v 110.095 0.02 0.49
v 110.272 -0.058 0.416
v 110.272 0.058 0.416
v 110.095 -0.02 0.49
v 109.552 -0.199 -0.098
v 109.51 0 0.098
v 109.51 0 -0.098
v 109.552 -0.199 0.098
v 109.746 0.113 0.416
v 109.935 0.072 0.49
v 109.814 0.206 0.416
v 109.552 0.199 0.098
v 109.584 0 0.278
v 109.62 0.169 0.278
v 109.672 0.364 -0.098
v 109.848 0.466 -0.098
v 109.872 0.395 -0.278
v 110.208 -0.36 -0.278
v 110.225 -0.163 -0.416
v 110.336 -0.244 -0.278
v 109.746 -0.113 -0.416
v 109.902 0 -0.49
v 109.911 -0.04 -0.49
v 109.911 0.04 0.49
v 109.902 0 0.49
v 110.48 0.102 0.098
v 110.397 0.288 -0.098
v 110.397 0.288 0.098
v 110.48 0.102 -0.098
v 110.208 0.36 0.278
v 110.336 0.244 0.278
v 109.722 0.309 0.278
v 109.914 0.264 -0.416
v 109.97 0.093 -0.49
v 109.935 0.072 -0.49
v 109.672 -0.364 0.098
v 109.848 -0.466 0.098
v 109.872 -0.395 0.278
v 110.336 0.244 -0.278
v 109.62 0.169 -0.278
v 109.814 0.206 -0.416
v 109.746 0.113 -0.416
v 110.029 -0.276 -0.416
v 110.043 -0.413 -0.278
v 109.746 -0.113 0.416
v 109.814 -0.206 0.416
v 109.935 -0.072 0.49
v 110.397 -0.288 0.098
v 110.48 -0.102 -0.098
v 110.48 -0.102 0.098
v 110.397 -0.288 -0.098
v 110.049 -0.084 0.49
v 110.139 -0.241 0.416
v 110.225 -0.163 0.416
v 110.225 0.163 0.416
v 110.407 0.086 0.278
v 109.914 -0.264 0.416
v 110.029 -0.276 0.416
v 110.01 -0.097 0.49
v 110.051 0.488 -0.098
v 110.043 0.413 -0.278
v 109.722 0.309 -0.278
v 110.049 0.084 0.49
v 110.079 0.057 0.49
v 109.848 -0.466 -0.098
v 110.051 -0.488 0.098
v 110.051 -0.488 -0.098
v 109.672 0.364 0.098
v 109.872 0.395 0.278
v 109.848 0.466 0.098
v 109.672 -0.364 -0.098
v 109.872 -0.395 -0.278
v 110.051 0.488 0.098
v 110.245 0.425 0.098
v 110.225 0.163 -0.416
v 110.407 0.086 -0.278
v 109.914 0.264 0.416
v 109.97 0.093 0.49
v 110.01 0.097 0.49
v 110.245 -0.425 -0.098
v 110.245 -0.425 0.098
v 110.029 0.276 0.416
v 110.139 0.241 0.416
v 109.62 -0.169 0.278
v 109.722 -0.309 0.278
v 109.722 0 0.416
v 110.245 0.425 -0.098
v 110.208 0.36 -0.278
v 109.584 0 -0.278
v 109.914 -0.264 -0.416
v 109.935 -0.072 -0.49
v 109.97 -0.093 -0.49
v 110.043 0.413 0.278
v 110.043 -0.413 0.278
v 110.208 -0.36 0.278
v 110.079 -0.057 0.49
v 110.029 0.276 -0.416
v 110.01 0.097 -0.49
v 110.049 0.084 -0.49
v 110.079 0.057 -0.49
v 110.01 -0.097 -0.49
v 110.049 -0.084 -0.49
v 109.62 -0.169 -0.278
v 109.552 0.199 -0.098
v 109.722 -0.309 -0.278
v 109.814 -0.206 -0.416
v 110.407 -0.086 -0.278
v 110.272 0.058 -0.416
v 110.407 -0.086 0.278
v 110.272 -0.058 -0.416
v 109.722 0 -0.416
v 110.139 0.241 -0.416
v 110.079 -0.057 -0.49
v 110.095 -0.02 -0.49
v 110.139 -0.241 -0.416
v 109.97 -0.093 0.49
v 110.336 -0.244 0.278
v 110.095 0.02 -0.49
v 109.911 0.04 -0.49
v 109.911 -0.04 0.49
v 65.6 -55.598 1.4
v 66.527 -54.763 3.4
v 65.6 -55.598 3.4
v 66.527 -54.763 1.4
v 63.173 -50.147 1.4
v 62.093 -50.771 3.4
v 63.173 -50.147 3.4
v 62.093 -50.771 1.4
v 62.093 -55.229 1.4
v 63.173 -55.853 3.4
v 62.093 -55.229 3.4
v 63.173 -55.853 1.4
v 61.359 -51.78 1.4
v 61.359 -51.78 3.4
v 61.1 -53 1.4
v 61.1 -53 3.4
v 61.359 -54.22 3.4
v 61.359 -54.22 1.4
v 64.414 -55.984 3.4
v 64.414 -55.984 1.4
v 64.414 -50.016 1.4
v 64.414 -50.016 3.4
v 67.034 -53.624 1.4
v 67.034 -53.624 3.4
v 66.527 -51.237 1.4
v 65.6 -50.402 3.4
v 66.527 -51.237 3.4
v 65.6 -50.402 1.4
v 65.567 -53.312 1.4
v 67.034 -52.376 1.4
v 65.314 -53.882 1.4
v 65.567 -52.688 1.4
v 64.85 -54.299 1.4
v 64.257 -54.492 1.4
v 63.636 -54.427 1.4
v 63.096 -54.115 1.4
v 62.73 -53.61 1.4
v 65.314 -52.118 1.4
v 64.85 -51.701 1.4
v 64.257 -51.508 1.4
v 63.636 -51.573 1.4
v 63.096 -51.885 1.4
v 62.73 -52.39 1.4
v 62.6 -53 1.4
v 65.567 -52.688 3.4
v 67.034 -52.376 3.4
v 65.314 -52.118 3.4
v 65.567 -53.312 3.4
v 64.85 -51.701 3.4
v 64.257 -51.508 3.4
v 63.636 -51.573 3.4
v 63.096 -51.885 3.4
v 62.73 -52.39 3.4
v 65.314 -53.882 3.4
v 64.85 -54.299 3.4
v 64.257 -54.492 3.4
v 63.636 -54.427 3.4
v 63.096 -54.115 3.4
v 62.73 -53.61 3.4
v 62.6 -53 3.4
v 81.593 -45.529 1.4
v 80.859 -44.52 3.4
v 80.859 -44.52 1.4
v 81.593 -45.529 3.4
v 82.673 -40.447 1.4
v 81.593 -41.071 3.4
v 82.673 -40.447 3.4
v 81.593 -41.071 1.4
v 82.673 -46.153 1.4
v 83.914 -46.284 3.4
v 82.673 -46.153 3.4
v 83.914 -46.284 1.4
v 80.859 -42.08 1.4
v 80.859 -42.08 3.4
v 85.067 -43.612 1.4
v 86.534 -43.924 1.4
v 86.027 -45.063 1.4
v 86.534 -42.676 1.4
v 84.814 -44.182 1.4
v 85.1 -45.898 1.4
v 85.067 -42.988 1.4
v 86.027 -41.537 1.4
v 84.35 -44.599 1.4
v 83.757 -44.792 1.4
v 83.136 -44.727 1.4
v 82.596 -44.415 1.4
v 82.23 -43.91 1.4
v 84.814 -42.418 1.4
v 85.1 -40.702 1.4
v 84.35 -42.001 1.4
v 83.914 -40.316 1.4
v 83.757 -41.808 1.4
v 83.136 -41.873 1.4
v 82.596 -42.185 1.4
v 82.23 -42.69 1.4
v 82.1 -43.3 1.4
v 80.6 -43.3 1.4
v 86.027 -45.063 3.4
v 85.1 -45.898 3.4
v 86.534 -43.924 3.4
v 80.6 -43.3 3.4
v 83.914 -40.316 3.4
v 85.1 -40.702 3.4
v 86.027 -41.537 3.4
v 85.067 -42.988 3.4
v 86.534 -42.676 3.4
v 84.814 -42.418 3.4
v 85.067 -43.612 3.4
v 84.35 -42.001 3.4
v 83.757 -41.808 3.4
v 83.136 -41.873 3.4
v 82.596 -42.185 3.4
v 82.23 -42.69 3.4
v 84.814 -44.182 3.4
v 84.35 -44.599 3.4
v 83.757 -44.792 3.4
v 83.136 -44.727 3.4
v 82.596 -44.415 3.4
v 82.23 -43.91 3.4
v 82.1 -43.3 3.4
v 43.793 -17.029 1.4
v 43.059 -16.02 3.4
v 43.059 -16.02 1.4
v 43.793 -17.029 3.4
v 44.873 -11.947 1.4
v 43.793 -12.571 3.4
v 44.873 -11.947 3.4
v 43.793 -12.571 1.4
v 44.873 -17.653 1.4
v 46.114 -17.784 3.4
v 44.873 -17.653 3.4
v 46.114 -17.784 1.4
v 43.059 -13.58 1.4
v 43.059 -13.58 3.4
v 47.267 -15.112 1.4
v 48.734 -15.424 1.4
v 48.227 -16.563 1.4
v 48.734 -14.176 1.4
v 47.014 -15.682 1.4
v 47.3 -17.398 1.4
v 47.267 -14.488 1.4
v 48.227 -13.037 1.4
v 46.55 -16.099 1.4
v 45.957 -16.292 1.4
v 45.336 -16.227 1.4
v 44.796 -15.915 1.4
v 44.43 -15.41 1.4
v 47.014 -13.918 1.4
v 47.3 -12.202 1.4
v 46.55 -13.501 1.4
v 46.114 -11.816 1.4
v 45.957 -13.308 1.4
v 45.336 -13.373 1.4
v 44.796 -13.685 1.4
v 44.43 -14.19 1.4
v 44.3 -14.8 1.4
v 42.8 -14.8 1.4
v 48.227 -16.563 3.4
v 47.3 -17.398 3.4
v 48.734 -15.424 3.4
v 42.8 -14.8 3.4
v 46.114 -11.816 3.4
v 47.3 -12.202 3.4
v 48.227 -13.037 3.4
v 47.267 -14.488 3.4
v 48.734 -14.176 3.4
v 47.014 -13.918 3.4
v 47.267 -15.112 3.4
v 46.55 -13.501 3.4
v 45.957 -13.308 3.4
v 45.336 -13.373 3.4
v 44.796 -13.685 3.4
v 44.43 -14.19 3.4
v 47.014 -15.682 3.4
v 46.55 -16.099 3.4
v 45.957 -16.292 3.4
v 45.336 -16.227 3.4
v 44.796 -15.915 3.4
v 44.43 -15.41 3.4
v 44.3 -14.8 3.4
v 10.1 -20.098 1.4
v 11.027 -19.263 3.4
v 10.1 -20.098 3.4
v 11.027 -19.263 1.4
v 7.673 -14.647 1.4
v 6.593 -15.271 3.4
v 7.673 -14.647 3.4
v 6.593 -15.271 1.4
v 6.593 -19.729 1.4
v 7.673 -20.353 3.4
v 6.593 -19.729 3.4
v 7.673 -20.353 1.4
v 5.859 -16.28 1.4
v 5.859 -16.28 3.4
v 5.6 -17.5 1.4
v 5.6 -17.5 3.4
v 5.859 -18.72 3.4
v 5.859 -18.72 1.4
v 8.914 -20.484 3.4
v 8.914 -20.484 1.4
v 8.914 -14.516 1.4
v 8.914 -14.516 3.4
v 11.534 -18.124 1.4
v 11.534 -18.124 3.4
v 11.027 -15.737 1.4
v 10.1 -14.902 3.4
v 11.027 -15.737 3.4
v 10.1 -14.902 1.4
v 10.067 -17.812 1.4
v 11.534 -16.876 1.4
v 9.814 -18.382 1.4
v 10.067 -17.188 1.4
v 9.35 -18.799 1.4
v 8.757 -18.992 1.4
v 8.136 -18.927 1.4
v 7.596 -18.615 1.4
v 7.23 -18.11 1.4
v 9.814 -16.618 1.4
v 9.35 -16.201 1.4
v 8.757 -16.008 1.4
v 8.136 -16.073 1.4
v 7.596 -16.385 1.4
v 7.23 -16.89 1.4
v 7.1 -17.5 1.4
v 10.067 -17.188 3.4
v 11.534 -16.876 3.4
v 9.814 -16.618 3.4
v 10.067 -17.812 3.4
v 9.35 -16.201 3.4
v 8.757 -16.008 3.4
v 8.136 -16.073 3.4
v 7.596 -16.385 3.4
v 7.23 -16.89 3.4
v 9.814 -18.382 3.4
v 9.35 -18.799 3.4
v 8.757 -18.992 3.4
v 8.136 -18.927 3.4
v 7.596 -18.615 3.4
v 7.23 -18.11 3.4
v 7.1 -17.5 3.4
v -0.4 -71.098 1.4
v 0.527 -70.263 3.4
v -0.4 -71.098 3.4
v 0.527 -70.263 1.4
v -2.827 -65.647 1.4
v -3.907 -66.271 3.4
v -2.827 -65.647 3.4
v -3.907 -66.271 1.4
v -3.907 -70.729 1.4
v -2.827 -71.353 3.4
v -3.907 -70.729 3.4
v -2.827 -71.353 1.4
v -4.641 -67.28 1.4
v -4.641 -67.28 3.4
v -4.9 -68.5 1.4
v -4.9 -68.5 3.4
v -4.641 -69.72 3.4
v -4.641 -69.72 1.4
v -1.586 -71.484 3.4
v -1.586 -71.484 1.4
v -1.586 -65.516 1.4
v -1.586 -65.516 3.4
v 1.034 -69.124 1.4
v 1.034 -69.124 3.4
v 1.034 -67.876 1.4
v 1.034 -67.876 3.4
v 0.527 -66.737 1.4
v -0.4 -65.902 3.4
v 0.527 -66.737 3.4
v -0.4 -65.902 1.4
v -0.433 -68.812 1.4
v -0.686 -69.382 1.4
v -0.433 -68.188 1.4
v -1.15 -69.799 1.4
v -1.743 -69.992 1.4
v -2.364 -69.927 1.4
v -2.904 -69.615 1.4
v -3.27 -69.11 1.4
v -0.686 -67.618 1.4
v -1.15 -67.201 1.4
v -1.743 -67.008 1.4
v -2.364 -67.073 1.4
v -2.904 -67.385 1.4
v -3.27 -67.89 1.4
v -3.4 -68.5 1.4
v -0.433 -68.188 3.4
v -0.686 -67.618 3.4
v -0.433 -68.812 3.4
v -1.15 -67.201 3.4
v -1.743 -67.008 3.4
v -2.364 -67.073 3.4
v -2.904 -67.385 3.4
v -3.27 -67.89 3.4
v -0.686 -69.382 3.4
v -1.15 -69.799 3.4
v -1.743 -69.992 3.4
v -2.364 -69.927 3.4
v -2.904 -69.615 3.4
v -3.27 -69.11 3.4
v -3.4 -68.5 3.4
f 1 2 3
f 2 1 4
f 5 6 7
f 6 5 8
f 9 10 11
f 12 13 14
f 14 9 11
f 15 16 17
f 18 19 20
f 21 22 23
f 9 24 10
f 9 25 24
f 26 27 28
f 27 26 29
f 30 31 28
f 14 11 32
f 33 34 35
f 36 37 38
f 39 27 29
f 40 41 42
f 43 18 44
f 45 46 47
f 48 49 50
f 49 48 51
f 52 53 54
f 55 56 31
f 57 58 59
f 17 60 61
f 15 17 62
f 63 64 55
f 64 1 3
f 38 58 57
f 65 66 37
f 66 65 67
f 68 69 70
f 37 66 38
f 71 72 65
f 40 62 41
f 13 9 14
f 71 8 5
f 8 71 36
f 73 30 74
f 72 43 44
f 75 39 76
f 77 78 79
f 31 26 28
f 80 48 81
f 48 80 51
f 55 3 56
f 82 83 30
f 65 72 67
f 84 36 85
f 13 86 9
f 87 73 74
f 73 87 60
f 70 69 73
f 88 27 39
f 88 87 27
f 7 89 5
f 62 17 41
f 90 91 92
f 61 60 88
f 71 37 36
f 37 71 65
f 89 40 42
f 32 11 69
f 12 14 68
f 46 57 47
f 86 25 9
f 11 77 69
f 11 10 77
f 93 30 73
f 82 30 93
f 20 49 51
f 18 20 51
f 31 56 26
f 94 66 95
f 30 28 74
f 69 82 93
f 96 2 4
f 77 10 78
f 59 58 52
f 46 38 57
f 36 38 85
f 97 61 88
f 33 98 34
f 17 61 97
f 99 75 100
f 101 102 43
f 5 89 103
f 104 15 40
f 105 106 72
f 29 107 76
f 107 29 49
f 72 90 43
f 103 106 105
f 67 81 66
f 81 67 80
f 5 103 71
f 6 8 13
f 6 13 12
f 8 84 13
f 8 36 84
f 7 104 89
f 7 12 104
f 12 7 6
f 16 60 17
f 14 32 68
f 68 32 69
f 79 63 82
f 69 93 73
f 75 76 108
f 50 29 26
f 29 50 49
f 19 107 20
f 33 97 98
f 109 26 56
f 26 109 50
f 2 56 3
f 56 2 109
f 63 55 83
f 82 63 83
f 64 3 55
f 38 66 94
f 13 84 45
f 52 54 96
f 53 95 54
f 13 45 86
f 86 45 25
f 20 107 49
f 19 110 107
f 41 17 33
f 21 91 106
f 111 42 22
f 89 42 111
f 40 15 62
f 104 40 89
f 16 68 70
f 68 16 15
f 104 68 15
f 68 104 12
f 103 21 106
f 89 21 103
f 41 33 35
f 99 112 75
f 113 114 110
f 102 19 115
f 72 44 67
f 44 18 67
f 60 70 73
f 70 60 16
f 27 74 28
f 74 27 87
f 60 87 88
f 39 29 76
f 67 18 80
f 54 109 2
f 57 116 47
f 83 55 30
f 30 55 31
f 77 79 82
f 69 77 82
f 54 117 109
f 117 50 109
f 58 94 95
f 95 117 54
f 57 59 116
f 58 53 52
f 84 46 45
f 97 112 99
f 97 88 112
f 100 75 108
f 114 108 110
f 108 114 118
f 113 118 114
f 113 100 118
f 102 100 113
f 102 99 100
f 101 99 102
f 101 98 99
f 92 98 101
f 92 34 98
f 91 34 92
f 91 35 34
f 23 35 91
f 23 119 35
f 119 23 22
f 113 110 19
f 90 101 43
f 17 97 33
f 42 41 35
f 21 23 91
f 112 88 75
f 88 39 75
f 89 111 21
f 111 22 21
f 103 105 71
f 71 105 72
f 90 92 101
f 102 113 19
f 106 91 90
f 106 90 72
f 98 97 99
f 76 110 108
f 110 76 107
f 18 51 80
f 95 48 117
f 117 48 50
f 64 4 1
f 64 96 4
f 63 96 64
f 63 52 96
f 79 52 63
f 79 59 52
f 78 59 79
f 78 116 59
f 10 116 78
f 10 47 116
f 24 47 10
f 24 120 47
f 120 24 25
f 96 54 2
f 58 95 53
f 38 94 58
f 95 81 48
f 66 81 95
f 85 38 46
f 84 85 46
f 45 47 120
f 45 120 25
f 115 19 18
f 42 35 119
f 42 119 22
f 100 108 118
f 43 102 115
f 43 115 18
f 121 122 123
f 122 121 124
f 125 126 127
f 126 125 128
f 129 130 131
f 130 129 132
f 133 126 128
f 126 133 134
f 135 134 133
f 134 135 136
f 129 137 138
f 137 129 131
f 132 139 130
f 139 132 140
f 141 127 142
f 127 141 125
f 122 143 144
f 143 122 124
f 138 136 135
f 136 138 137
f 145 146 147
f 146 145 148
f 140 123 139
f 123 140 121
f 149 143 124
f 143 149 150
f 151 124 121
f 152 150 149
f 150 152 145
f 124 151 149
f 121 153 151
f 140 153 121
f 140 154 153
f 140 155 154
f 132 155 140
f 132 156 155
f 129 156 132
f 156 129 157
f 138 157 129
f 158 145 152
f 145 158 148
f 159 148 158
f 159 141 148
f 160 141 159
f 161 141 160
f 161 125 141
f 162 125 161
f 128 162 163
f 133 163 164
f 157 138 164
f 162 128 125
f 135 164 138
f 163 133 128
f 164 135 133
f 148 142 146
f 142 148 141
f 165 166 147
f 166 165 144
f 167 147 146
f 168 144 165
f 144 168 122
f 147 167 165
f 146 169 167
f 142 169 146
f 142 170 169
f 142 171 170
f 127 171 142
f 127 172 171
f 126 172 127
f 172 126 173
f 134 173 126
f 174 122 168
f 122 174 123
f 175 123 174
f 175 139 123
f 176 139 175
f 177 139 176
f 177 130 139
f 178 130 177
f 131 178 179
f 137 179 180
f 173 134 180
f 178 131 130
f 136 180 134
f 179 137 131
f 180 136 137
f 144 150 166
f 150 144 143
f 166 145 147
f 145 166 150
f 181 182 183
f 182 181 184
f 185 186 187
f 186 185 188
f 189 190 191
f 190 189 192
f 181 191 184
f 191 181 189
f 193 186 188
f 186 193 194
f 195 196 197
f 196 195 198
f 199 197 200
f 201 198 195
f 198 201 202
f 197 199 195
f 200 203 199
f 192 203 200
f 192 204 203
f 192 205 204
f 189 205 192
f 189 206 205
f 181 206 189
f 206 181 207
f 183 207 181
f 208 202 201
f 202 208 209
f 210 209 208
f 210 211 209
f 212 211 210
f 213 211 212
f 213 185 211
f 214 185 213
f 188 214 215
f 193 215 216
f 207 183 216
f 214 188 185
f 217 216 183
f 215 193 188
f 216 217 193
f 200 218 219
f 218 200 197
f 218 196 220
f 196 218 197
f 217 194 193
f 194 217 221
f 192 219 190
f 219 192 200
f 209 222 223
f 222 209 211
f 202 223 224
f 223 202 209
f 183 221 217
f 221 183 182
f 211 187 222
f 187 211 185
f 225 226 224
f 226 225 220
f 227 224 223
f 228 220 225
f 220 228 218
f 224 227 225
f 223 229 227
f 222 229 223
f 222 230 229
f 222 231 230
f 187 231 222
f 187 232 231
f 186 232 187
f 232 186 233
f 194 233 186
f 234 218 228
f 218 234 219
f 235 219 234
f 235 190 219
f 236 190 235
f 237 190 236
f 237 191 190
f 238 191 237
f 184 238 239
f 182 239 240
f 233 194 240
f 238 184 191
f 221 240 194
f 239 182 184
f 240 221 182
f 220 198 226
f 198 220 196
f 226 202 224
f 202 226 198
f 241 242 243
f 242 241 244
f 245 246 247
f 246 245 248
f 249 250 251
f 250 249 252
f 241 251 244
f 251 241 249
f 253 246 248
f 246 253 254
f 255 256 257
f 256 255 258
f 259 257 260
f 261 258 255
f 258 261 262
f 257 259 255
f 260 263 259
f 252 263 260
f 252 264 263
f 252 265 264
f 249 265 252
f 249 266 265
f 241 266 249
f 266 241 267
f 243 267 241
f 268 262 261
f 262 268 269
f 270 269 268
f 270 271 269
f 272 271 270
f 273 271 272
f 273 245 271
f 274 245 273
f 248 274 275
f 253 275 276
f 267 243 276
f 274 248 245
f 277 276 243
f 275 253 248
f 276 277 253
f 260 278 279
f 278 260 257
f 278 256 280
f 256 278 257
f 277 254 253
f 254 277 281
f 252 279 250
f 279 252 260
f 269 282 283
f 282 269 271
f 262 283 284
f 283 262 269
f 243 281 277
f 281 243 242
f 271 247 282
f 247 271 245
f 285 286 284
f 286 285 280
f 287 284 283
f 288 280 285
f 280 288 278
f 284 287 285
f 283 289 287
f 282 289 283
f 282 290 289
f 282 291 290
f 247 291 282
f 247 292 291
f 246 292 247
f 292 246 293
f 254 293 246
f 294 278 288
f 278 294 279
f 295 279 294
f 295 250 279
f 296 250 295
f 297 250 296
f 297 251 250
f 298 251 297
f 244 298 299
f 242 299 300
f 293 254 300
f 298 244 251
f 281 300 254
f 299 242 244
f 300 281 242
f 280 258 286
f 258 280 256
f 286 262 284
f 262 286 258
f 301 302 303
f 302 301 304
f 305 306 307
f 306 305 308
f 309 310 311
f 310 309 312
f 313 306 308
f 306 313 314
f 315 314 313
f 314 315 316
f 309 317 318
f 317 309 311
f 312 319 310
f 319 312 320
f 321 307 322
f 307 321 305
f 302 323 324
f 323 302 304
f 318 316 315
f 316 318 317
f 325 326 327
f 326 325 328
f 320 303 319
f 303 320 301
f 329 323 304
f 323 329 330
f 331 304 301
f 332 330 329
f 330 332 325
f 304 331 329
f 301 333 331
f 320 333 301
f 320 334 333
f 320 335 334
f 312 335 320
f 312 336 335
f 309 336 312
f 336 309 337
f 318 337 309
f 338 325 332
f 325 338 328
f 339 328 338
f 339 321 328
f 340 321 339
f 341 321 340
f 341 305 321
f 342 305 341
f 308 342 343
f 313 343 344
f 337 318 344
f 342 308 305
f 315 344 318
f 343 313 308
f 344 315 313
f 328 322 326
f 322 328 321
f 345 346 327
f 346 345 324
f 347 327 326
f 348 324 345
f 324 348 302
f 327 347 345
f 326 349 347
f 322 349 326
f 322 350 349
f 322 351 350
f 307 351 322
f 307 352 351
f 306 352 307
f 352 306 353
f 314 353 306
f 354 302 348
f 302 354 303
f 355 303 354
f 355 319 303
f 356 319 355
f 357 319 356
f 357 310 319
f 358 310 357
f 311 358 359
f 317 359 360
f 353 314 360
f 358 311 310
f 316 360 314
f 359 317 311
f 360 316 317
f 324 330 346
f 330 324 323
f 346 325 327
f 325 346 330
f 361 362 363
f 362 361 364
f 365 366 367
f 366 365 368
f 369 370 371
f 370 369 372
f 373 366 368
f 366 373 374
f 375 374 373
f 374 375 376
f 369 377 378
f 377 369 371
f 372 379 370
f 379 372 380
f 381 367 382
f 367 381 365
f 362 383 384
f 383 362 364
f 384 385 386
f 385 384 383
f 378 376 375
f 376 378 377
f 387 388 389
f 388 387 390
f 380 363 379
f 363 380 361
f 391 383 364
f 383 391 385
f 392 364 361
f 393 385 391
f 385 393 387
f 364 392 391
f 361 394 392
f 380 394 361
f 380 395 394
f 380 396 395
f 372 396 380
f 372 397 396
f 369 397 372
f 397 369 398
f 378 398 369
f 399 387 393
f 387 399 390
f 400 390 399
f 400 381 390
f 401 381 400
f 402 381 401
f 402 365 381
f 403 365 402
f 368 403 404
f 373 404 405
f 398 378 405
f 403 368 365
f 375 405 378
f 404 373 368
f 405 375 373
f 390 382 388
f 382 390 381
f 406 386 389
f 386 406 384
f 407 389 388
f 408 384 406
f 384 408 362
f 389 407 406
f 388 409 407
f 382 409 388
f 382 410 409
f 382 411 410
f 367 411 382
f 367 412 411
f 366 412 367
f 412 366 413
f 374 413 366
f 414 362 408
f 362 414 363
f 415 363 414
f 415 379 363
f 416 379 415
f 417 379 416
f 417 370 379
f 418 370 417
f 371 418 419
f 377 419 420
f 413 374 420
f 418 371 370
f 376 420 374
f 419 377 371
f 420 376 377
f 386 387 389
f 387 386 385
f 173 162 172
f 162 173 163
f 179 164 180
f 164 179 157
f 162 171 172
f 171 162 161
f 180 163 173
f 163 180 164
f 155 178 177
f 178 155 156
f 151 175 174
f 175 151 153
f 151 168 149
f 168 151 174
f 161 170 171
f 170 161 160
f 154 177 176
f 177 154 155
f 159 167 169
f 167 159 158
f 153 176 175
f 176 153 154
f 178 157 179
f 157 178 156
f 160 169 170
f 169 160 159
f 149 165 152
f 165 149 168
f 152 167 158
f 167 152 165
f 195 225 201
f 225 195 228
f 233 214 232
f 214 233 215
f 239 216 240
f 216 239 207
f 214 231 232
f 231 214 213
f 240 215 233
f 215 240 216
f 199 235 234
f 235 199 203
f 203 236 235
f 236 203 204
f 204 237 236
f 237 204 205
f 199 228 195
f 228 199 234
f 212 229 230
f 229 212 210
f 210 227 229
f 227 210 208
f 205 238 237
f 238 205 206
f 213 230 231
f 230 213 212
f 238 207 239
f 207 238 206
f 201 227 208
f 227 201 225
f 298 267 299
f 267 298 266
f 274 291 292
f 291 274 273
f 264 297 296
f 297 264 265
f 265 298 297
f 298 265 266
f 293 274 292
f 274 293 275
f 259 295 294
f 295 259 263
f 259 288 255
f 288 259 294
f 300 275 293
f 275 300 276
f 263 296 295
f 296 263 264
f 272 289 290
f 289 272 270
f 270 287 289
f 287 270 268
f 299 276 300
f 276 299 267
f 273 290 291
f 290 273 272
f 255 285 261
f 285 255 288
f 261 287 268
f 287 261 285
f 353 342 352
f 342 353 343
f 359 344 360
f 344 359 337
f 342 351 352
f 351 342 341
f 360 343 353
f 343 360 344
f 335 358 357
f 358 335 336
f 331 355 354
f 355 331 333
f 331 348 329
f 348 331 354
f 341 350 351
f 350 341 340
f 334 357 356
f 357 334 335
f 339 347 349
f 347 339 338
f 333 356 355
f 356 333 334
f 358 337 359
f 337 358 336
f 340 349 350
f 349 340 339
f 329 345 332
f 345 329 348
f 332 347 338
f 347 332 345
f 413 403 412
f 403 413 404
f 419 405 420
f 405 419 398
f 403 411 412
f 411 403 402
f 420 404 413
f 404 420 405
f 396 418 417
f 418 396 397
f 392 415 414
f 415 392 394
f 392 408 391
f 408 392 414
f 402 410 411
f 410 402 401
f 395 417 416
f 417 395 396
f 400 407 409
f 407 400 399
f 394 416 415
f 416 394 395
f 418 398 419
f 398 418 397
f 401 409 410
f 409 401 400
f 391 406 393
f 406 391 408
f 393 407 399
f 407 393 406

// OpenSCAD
hole_locations = [
    [45.9, -53],
    [26.4, -43.3],
    [64.2, -14.8],
    [101.4, -17.5],
    [111.9, -68.5],
];

pcb_thickness = 1.6;
component_thickness = 2;
case_thickness = 1.5;

plate_thickness = 1.2;
pcb_plate_gap = 1;

total_plate_thickness = plate_thickness + pcb_plate_gap;

total_thickness = pcb_thickness +
    component_thickness + case_thickness +
    total_plate_thickness;

pcb_case_margin = 0.5;
pcb_ridge_margin = 1;

case_wall_thickness = 4;

heat_insert_radius = 1.5;
strut_radius = 3;

// rendering level
$fn = 15;

right_side = true;

module pcb() {
    translate([-75, 50, 0])
    scale([25.4, 25.4, 1])
    import("empty-pcb.dxf");
}

module pcb_ghost() {
    %
    translate([0, 0, case_thickness + component_thickness])
    linear_extrude(pcb_thickness)
    pcb();
}

module pcb_cutout() {
    translate([0, 0, case_thickness + component_thickness])
    linear_extrude(pcb_thickness + total_plate_thickness + 1)
    offset(pcb_case_margin)
    pcb();
}

module component_cutout() {
    translate([0, 0, case_thickness])
    linear_extrude(component_thickness + pcb_thickness + 0.1)
    offset(-pcb_ridge_margin)
    pcb();
}

module case_body() {
    minkowski() {
        linear_extrude(total_thickness)
        offset(case_wall_thickness)
        pcb();
        sphere(0.5);
    }
}

module heat_insert_holes() {
    for (location = hole_locations) {
        translate([location[0], location[1], case_thickness + component_thickness - 3])
        linear_extrude(10)
        circle(heat_insert_radius);
    }
}

module heat_insert_struts() {
    for (location = hole_locations) {
        translate([location[0], location[1], case_thickness - 0.1])
        linear_extrude(component_thickness)
        circle(strut_radius);
    }
}

module wire_port_cutout() {
    translate([24.135, -28, case_thickness + component_thickness + total_thickness / 2+ pcb_thickness])
    rotate([0, 0, 8])
    cube([38.75, 35, total_thickness], center=true);
}

module power_switch_cutout() {
    z_rotation_base = 8;
    z_rotation_delta = 15;

    intersection() {
        translate([27.7, -18.5, 1])
        rotate([0, 0, z_rotation_base + z_rotation_delta])
        cube([12, 10, 6]);

        translate([23.7, -16, 1])
        rotate([0, 0, z_rotation_base - z_rotation_delta])
        cube([12, 10, 6]);

        translate([24.7, -17, 2])
        rotate([-10, 0, z_rotation_base])
        cube([15, 10, 6]);
    }
}

module reset_switch_cutout() {
    intersection() {
        translate([6.4, -42.3, 3])
        rotate([-15, 0, 8])
        cube([10, 15, 6]);
        
        translate([6.4, -41.03, 0])
        rotate([0, 0, 8])
        cube([10, 15, 9]);

        translate([6.4, -46, 1])
        rotate([0, 0, 28])
        cube([10, 21, 6]);
    }
}

module full_case() {
    difference() {
        union() {
            difference() {
                case_body();
                pcb_cutout();
                component_cutout();
                wire_port_cutout();
                power_switch_cutout();
                reset_switch_cutout();
            };
            heat_insert_struts();
        };
        heat_insert_holes();
        pcb_ghost();
    };
}

if (right_side) {
    translate([110, 0, 0])
    mirror([1, 0, 0])
    full_case();
} else {
    full_case();
};
